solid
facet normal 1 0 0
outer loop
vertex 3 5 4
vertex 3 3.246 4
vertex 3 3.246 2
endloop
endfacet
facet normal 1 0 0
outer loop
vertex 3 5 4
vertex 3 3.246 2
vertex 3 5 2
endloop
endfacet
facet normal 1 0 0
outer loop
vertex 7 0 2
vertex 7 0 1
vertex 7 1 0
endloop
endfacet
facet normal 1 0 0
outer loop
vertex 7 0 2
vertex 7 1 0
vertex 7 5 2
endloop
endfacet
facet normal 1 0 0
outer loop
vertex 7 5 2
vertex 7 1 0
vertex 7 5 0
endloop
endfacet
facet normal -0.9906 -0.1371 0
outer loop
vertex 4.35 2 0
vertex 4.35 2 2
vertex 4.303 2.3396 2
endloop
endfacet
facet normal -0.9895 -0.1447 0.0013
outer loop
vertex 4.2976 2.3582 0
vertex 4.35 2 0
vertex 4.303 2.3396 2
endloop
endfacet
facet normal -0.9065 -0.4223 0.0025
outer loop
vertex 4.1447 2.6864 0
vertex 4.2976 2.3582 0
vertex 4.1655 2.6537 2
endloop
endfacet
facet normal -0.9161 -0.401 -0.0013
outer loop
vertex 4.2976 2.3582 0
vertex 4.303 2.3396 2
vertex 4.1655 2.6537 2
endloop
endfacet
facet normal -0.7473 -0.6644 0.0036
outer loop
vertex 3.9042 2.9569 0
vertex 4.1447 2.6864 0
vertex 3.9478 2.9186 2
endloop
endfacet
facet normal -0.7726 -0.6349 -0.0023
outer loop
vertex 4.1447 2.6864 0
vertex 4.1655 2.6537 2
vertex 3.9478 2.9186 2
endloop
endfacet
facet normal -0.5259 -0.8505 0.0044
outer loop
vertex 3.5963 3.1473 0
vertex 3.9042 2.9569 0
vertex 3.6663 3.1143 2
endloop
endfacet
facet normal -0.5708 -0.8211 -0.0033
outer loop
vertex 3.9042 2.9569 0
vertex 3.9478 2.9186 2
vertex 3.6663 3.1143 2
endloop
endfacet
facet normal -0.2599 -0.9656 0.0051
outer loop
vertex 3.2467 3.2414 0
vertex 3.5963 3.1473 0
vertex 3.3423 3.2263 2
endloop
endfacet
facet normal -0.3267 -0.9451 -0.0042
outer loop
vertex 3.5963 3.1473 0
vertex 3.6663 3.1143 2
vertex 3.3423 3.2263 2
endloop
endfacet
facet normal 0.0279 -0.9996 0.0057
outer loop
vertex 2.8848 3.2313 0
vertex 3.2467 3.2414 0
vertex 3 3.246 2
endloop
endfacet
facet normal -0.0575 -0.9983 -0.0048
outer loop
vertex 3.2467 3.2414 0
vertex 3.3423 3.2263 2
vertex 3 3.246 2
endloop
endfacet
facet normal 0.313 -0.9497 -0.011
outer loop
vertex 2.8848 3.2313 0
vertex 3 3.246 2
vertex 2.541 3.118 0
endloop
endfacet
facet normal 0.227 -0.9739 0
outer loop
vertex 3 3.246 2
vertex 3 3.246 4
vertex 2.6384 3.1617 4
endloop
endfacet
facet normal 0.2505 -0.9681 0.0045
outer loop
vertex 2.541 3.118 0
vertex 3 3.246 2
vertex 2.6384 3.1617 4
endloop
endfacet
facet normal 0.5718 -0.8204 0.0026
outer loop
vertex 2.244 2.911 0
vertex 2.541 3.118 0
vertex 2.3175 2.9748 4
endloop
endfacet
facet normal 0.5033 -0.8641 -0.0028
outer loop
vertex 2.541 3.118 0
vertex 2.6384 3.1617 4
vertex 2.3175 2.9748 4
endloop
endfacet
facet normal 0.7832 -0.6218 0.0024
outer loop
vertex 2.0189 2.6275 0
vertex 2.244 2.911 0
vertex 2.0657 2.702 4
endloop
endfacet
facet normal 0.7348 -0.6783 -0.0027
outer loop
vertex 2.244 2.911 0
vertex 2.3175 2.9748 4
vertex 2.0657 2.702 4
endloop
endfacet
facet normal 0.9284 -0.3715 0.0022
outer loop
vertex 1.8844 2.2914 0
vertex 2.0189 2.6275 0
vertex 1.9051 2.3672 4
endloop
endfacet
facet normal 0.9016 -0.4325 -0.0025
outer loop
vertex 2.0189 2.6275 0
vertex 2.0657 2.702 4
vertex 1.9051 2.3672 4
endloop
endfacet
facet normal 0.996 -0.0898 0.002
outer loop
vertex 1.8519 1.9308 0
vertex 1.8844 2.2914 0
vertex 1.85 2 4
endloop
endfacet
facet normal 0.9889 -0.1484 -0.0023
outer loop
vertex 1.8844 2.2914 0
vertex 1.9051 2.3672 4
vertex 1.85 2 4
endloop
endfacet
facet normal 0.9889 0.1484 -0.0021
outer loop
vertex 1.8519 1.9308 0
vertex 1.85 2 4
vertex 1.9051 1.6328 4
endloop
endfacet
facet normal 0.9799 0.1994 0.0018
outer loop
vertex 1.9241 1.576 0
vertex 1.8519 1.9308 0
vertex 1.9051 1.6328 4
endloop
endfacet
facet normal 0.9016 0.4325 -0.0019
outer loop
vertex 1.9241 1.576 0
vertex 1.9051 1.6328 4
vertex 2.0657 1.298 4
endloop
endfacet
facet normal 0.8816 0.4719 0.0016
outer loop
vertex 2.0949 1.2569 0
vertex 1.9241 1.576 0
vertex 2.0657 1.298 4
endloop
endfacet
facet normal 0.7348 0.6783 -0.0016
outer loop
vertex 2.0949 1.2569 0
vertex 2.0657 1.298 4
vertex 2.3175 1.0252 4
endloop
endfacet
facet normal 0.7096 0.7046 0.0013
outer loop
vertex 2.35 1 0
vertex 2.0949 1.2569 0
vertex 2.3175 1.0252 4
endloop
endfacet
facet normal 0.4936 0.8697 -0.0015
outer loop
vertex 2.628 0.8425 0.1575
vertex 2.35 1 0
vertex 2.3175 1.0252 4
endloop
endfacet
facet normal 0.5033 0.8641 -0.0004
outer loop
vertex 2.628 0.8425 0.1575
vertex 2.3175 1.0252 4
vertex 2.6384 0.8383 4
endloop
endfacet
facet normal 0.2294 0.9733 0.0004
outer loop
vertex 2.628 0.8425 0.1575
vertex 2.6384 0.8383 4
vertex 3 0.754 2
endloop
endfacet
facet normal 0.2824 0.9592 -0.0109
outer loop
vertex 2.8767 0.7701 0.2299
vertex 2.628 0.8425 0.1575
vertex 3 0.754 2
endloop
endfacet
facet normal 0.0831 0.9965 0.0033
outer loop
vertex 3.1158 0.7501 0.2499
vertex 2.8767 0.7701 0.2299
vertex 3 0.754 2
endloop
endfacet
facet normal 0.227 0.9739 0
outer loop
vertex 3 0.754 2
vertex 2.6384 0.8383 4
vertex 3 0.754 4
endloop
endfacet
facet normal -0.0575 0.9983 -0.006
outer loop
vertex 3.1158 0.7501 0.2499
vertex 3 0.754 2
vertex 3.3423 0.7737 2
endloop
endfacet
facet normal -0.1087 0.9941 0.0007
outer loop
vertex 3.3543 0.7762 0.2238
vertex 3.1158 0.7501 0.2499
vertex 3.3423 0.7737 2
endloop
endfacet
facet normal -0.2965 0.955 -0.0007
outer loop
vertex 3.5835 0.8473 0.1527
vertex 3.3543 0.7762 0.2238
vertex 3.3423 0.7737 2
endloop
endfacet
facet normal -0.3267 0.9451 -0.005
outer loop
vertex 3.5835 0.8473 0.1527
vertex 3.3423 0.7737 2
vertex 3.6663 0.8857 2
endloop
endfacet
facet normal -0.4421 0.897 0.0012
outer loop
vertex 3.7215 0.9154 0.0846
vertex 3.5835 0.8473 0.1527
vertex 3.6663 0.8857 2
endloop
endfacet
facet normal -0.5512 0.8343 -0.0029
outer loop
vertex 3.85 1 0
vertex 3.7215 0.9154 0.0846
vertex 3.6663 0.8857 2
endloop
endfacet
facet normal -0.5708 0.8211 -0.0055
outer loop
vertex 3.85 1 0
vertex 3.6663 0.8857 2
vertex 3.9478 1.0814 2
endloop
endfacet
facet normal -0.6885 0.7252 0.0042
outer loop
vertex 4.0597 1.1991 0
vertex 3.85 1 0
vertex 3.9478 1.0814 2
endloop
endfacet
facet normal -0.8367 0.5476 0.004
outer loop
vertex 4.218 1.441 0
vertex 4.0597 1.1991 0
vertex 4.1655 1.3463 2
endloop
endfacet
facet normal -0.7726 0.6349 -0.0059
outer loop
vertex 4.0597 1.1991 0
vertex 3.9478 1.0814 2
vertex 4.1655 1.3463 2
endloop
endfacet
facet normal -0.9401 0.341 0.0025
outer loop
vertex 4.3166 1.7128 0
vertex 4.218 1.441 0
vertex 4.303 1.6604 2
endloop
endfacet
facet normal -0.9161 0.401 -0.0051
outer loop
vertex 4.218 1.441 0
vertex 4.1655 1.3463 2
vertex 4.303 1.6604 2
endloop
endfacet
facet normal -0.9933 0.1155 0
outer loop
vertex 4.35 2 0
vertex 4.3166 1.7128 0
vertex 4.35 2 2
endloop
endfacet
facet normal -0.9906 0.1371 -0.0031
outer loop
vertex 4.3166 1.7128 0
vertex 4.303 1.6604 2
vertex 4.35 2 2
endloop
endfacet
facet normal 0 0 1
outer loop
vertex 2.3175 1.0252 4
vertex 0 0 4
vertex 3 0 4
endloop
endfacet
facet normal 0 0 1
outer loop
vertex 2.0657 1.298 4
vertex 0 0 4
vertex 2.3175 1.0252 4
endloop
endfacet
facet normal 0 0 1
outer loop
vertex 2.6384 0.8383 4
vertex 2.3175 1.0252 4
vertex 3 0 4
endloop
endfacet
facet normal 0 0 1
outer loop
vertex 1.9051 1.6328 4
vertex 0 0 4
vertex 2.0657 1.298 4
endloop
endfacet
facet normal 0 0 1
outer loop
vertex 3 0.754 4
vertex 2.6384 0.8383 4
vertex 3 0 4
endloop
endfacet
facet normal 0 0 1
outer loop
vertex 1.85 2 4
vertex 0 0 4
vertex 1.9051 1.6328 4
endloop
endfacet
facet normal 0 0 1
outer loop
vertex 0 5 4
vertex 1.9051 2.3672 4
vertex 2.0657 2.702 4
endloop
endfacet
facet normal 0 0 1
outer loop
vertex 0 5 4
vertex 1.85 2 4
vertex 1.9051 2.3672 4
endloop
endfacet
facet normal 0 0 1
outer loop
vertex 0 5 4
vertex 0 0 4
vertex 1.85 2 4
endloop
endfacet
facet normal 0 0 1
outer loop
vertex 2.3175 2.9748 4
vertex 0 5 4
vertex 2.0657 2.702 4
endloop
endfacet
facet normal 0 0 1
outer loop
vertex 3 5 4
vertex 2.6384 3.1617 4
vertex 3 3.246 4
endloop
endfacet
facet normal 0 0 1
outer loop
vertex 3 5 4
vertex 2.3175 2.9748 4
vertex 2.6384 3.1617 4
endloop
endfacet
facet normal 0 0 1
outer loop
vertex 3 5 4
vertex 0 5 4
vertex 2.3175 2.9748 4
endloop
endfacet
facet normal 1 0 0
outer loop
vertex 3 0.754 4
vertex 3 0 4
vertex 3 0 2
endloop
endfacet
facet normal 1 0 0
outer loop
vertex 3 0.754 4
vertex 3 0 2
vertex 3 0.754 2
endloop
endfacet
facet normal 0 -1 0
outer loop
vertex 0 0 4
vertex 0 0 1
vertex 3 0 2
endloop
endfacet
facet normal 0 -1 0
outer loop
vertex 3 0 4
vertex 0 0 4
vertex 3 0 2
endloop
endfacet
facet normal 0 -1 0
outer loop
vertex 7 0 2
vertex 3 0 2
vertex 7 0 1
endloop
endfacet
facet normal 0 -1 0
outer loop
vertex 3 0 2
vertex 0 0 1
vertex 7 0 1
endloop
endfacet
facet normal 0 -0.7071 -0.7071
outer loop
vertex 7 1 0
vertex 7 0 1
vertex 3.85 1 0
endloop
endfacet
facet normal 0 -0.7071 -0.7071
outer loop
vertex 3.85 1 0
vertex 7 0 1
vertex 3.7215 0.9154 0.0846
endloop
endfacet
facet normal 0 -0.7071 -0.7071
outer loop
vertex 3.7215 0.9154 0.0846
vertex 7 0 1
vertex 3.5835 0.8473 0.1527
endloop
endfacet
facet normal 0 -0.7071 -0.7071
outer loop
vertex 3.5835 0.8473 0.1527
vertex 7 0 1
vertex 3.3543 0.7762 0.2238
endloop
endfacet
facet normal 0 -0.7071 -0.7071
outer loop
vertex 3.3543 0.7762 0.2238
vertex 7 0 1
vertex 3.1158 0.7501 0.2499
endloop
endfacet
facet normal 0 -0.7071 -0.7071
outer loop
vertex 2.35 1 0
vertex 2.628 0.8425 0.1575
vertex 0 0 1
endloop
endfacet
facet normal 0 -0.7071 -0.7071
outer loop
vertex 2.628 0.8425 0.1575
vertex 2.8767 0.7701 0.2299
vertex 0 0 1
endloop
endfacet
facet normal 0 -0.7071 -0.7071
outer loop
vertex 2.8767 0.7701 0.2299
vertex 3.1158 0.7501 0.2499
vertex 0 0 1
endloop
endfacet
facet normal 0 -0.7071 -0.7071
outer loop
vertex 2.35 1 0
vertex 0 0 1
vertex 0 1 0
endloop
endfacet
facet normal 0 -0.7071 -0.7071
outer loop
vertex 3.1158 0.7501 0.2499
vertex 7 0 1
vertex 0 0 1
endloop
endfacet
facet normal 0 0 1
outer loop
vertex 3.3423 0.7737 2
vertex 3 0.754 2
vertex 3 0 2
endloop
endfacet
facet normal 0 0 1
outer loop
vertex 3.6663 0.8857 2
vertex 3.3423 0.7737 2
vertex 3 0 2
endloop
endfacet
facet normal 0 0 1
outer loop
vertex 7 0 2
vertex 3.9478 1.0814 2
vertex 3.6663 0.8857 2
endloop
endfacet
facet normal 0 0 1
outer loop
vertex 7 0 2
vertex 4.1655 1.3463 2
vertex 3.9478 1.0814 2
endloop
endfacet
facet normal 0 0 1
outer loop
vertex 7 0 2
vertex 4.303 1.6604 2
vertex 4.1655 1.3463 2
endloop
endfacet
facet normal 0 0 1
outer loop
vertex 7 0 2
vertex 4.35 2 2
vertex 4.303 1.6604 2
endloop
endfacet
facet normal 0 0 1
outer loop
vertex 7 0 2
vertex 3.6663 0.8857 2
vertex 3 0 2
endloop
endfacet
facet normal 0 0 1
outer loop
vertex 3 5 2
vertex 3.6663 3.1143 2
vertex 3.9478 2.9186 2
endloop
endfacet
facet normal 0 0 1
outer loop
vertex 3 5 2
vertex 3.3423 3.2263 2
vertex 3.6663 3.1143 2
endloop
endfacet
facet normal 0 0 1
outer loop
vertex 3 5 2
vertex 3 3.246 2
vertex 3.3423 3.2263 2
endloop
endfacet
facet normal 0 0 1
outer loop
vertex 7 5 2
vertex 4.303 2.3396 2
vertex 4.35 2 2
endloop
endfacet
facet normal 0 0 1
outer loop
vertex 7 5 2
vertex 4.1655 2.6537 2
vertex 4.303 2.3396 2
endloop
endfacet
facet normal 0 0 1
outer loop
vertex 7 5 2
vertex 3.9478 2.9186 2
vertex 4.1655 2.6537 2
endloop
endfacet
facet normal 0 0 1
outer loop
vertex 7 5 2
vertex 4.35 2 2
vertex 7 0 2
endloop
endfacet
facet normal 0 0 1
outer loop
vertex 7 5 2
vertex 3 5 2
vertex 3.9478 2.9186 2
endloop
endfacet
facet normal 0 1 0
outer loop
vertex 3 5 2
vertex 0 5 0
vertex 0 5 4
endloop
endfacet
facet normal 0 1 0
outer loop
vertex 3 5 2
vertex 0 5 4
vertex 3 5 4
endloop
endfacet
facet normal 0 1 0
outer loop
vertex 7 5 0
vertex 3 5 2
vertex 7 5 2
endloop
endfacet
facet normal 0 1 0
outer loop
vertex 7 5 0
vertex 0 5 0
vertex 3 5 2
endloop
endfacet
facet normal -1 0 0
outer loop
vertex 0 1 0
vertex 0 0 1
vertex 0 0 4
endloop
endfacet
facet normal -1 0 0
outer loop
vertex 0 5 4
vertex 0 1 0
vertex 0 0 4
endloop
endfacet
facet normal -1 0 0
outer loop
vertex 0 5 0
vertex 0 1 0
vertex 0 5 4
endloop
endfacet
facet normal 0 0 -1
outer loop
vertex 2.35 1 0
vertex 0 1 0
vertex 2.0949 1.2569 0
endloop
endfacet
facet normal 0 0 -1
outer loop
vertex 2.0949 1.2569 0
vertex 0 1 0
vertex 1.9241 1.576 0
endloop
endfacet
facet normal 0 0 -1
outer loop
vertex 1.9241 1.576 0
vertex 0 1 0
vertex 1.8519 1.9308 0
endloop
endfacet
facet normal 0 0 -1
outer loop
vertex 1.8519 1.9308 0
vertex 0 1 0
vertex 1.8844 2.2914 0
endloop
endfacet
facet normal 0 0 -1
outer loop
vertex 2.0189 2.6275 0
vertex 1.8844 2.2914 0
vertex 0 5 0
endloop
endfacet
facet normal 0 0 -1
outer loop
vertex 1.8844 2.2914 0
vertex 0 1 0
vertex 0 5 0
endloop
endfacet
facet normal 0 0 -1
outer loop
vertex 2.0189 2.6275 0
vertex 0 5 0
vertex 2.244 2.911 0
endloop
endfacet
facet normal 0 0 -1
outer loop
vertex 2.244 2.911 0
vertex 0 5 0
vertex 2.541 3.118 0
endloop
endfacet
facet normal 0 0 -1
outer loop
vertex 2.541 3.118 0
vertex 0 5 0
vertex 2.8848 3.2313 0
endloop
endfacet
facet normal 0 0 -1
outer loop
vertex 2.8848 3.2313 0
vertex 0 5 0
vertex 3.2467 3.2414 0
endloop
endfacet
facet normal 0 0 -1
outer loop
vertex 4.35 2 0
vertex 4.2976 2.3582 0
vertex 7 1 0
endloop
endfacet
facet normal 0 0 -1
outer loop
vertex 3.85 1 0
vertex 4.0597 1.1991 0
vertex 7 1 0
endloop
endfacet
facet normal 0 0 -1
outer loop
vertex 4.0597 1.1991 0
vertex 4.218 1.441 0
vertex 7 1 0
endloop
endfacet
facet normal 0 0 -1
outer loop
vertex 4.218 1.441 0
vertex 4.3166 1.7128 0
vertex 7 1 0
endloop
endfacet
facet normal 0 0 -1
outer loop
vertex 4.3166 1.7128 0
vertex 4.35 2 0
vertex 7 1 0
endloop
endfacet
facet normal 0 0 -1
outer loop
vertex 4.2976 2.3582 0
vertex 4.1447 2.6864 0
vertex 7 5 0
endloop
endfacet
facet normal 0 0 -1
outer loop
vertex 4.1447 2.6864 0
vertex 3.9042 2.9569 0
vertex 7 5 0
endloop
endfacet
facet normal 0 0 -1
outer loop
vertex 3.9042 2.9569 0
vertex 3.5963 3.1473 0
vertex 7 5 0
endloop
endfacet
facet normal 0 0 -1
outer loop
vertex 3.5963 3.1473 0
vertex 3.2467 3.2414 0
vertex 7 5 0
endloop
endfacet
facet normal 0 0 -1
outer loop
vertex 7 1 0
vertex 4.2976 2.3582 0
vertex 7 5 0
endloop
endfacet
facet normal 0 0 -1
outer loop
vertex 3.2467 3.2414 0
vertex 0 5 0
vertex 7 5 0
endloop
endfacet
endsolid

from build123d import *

# Parameters (mm, degrees)
SKETCH1_W                 = 7
SKETCH1_H                 = 5
BOSS_EXTRUDE1_DEPTH       = 4
M3X0_5_TAPPED_HOLE1_D     = 2.5
M3X0_5_TAPPED_HOLE1_DEPTH = 8.5
M3X0_5_TAPPED_HOLE1_TIP   = 0.751075774
SKETCH6_W                 = 4
SKETCH6_H                 = 5
CUT_EXTRUDE1_DEPTH        = 2
CHAMFER1_SIZE             = 1


with BuildPart() as part:
    # Sketch1 → Boss-Extrude1 (new body)
    with BuildSketch(Plane.XY):
        with Locations((3.5, 2.5)):
            Rectangle(SKETCH1_W, SKETCH1_H)
    extrude(amount=BOSS_EXTRUDE1_DEPTH)

    # M3x0.5 Tapped Hole1
    with Locations(Plane(origin=(0, 0, 0), x_dir=(-1, 0, 0), z_dir=(0, 0, -1))):
        with Locations((-3.1, 2)):
            Hole(M3X0_5_TAPPED_HOLE1_D / 2, depth=M3X0_5_TAPPED_HOLE1_DEPTH)
            with Locations((0, 0, -(M3X0_5_TAPPED_HOLE1_DEPTH + M3X0_5_TAPPED_HOLE1_TIP / 2))):  # 118° drill point
                Cone(0, M3X0_5_TAPPED_HOLE1_D / 2, M3X0_5_TAPPED_HOLE1_TIP, mode=Mode.SUBTRACT)

    # Sketch6 → Cut-Extrude1 (cut)
    with BuildSketch(Plane.XY.offset(4)):
        with Locations((5, 2.5)):
            Rectangle(SKETCH6_W, SKETCH6_H)
    extrude(amount=-CUT_EXTRUDE1_DEPTH, mode=Mode.SUBTRACT)

    # Chamfer1
    # the kernel refuses this chamfer: 1 mm, written as the material it takes off along each edge
    with BuildSketch(Plane(origin=(-2.571682988, 0, 0), x_dir=(0, -0.027495876610586372, 0.9996219169112968), z_dir=(1, 0, 0))) as chamfer1_piece_1:
        Polygon((CHAMFER1_SIZE * 0.999621916911, -CHAMFER1_SIZE * 0.0274958766106), (-CHAMFER1_SIZE * 0.0274958766106, -CHAMFER1_SIZE * 0.999621916911), (0, 0), align=None)
    extrude(amount=12.143365976, mode=Mode.SUBTRACT)


solid = part.part
